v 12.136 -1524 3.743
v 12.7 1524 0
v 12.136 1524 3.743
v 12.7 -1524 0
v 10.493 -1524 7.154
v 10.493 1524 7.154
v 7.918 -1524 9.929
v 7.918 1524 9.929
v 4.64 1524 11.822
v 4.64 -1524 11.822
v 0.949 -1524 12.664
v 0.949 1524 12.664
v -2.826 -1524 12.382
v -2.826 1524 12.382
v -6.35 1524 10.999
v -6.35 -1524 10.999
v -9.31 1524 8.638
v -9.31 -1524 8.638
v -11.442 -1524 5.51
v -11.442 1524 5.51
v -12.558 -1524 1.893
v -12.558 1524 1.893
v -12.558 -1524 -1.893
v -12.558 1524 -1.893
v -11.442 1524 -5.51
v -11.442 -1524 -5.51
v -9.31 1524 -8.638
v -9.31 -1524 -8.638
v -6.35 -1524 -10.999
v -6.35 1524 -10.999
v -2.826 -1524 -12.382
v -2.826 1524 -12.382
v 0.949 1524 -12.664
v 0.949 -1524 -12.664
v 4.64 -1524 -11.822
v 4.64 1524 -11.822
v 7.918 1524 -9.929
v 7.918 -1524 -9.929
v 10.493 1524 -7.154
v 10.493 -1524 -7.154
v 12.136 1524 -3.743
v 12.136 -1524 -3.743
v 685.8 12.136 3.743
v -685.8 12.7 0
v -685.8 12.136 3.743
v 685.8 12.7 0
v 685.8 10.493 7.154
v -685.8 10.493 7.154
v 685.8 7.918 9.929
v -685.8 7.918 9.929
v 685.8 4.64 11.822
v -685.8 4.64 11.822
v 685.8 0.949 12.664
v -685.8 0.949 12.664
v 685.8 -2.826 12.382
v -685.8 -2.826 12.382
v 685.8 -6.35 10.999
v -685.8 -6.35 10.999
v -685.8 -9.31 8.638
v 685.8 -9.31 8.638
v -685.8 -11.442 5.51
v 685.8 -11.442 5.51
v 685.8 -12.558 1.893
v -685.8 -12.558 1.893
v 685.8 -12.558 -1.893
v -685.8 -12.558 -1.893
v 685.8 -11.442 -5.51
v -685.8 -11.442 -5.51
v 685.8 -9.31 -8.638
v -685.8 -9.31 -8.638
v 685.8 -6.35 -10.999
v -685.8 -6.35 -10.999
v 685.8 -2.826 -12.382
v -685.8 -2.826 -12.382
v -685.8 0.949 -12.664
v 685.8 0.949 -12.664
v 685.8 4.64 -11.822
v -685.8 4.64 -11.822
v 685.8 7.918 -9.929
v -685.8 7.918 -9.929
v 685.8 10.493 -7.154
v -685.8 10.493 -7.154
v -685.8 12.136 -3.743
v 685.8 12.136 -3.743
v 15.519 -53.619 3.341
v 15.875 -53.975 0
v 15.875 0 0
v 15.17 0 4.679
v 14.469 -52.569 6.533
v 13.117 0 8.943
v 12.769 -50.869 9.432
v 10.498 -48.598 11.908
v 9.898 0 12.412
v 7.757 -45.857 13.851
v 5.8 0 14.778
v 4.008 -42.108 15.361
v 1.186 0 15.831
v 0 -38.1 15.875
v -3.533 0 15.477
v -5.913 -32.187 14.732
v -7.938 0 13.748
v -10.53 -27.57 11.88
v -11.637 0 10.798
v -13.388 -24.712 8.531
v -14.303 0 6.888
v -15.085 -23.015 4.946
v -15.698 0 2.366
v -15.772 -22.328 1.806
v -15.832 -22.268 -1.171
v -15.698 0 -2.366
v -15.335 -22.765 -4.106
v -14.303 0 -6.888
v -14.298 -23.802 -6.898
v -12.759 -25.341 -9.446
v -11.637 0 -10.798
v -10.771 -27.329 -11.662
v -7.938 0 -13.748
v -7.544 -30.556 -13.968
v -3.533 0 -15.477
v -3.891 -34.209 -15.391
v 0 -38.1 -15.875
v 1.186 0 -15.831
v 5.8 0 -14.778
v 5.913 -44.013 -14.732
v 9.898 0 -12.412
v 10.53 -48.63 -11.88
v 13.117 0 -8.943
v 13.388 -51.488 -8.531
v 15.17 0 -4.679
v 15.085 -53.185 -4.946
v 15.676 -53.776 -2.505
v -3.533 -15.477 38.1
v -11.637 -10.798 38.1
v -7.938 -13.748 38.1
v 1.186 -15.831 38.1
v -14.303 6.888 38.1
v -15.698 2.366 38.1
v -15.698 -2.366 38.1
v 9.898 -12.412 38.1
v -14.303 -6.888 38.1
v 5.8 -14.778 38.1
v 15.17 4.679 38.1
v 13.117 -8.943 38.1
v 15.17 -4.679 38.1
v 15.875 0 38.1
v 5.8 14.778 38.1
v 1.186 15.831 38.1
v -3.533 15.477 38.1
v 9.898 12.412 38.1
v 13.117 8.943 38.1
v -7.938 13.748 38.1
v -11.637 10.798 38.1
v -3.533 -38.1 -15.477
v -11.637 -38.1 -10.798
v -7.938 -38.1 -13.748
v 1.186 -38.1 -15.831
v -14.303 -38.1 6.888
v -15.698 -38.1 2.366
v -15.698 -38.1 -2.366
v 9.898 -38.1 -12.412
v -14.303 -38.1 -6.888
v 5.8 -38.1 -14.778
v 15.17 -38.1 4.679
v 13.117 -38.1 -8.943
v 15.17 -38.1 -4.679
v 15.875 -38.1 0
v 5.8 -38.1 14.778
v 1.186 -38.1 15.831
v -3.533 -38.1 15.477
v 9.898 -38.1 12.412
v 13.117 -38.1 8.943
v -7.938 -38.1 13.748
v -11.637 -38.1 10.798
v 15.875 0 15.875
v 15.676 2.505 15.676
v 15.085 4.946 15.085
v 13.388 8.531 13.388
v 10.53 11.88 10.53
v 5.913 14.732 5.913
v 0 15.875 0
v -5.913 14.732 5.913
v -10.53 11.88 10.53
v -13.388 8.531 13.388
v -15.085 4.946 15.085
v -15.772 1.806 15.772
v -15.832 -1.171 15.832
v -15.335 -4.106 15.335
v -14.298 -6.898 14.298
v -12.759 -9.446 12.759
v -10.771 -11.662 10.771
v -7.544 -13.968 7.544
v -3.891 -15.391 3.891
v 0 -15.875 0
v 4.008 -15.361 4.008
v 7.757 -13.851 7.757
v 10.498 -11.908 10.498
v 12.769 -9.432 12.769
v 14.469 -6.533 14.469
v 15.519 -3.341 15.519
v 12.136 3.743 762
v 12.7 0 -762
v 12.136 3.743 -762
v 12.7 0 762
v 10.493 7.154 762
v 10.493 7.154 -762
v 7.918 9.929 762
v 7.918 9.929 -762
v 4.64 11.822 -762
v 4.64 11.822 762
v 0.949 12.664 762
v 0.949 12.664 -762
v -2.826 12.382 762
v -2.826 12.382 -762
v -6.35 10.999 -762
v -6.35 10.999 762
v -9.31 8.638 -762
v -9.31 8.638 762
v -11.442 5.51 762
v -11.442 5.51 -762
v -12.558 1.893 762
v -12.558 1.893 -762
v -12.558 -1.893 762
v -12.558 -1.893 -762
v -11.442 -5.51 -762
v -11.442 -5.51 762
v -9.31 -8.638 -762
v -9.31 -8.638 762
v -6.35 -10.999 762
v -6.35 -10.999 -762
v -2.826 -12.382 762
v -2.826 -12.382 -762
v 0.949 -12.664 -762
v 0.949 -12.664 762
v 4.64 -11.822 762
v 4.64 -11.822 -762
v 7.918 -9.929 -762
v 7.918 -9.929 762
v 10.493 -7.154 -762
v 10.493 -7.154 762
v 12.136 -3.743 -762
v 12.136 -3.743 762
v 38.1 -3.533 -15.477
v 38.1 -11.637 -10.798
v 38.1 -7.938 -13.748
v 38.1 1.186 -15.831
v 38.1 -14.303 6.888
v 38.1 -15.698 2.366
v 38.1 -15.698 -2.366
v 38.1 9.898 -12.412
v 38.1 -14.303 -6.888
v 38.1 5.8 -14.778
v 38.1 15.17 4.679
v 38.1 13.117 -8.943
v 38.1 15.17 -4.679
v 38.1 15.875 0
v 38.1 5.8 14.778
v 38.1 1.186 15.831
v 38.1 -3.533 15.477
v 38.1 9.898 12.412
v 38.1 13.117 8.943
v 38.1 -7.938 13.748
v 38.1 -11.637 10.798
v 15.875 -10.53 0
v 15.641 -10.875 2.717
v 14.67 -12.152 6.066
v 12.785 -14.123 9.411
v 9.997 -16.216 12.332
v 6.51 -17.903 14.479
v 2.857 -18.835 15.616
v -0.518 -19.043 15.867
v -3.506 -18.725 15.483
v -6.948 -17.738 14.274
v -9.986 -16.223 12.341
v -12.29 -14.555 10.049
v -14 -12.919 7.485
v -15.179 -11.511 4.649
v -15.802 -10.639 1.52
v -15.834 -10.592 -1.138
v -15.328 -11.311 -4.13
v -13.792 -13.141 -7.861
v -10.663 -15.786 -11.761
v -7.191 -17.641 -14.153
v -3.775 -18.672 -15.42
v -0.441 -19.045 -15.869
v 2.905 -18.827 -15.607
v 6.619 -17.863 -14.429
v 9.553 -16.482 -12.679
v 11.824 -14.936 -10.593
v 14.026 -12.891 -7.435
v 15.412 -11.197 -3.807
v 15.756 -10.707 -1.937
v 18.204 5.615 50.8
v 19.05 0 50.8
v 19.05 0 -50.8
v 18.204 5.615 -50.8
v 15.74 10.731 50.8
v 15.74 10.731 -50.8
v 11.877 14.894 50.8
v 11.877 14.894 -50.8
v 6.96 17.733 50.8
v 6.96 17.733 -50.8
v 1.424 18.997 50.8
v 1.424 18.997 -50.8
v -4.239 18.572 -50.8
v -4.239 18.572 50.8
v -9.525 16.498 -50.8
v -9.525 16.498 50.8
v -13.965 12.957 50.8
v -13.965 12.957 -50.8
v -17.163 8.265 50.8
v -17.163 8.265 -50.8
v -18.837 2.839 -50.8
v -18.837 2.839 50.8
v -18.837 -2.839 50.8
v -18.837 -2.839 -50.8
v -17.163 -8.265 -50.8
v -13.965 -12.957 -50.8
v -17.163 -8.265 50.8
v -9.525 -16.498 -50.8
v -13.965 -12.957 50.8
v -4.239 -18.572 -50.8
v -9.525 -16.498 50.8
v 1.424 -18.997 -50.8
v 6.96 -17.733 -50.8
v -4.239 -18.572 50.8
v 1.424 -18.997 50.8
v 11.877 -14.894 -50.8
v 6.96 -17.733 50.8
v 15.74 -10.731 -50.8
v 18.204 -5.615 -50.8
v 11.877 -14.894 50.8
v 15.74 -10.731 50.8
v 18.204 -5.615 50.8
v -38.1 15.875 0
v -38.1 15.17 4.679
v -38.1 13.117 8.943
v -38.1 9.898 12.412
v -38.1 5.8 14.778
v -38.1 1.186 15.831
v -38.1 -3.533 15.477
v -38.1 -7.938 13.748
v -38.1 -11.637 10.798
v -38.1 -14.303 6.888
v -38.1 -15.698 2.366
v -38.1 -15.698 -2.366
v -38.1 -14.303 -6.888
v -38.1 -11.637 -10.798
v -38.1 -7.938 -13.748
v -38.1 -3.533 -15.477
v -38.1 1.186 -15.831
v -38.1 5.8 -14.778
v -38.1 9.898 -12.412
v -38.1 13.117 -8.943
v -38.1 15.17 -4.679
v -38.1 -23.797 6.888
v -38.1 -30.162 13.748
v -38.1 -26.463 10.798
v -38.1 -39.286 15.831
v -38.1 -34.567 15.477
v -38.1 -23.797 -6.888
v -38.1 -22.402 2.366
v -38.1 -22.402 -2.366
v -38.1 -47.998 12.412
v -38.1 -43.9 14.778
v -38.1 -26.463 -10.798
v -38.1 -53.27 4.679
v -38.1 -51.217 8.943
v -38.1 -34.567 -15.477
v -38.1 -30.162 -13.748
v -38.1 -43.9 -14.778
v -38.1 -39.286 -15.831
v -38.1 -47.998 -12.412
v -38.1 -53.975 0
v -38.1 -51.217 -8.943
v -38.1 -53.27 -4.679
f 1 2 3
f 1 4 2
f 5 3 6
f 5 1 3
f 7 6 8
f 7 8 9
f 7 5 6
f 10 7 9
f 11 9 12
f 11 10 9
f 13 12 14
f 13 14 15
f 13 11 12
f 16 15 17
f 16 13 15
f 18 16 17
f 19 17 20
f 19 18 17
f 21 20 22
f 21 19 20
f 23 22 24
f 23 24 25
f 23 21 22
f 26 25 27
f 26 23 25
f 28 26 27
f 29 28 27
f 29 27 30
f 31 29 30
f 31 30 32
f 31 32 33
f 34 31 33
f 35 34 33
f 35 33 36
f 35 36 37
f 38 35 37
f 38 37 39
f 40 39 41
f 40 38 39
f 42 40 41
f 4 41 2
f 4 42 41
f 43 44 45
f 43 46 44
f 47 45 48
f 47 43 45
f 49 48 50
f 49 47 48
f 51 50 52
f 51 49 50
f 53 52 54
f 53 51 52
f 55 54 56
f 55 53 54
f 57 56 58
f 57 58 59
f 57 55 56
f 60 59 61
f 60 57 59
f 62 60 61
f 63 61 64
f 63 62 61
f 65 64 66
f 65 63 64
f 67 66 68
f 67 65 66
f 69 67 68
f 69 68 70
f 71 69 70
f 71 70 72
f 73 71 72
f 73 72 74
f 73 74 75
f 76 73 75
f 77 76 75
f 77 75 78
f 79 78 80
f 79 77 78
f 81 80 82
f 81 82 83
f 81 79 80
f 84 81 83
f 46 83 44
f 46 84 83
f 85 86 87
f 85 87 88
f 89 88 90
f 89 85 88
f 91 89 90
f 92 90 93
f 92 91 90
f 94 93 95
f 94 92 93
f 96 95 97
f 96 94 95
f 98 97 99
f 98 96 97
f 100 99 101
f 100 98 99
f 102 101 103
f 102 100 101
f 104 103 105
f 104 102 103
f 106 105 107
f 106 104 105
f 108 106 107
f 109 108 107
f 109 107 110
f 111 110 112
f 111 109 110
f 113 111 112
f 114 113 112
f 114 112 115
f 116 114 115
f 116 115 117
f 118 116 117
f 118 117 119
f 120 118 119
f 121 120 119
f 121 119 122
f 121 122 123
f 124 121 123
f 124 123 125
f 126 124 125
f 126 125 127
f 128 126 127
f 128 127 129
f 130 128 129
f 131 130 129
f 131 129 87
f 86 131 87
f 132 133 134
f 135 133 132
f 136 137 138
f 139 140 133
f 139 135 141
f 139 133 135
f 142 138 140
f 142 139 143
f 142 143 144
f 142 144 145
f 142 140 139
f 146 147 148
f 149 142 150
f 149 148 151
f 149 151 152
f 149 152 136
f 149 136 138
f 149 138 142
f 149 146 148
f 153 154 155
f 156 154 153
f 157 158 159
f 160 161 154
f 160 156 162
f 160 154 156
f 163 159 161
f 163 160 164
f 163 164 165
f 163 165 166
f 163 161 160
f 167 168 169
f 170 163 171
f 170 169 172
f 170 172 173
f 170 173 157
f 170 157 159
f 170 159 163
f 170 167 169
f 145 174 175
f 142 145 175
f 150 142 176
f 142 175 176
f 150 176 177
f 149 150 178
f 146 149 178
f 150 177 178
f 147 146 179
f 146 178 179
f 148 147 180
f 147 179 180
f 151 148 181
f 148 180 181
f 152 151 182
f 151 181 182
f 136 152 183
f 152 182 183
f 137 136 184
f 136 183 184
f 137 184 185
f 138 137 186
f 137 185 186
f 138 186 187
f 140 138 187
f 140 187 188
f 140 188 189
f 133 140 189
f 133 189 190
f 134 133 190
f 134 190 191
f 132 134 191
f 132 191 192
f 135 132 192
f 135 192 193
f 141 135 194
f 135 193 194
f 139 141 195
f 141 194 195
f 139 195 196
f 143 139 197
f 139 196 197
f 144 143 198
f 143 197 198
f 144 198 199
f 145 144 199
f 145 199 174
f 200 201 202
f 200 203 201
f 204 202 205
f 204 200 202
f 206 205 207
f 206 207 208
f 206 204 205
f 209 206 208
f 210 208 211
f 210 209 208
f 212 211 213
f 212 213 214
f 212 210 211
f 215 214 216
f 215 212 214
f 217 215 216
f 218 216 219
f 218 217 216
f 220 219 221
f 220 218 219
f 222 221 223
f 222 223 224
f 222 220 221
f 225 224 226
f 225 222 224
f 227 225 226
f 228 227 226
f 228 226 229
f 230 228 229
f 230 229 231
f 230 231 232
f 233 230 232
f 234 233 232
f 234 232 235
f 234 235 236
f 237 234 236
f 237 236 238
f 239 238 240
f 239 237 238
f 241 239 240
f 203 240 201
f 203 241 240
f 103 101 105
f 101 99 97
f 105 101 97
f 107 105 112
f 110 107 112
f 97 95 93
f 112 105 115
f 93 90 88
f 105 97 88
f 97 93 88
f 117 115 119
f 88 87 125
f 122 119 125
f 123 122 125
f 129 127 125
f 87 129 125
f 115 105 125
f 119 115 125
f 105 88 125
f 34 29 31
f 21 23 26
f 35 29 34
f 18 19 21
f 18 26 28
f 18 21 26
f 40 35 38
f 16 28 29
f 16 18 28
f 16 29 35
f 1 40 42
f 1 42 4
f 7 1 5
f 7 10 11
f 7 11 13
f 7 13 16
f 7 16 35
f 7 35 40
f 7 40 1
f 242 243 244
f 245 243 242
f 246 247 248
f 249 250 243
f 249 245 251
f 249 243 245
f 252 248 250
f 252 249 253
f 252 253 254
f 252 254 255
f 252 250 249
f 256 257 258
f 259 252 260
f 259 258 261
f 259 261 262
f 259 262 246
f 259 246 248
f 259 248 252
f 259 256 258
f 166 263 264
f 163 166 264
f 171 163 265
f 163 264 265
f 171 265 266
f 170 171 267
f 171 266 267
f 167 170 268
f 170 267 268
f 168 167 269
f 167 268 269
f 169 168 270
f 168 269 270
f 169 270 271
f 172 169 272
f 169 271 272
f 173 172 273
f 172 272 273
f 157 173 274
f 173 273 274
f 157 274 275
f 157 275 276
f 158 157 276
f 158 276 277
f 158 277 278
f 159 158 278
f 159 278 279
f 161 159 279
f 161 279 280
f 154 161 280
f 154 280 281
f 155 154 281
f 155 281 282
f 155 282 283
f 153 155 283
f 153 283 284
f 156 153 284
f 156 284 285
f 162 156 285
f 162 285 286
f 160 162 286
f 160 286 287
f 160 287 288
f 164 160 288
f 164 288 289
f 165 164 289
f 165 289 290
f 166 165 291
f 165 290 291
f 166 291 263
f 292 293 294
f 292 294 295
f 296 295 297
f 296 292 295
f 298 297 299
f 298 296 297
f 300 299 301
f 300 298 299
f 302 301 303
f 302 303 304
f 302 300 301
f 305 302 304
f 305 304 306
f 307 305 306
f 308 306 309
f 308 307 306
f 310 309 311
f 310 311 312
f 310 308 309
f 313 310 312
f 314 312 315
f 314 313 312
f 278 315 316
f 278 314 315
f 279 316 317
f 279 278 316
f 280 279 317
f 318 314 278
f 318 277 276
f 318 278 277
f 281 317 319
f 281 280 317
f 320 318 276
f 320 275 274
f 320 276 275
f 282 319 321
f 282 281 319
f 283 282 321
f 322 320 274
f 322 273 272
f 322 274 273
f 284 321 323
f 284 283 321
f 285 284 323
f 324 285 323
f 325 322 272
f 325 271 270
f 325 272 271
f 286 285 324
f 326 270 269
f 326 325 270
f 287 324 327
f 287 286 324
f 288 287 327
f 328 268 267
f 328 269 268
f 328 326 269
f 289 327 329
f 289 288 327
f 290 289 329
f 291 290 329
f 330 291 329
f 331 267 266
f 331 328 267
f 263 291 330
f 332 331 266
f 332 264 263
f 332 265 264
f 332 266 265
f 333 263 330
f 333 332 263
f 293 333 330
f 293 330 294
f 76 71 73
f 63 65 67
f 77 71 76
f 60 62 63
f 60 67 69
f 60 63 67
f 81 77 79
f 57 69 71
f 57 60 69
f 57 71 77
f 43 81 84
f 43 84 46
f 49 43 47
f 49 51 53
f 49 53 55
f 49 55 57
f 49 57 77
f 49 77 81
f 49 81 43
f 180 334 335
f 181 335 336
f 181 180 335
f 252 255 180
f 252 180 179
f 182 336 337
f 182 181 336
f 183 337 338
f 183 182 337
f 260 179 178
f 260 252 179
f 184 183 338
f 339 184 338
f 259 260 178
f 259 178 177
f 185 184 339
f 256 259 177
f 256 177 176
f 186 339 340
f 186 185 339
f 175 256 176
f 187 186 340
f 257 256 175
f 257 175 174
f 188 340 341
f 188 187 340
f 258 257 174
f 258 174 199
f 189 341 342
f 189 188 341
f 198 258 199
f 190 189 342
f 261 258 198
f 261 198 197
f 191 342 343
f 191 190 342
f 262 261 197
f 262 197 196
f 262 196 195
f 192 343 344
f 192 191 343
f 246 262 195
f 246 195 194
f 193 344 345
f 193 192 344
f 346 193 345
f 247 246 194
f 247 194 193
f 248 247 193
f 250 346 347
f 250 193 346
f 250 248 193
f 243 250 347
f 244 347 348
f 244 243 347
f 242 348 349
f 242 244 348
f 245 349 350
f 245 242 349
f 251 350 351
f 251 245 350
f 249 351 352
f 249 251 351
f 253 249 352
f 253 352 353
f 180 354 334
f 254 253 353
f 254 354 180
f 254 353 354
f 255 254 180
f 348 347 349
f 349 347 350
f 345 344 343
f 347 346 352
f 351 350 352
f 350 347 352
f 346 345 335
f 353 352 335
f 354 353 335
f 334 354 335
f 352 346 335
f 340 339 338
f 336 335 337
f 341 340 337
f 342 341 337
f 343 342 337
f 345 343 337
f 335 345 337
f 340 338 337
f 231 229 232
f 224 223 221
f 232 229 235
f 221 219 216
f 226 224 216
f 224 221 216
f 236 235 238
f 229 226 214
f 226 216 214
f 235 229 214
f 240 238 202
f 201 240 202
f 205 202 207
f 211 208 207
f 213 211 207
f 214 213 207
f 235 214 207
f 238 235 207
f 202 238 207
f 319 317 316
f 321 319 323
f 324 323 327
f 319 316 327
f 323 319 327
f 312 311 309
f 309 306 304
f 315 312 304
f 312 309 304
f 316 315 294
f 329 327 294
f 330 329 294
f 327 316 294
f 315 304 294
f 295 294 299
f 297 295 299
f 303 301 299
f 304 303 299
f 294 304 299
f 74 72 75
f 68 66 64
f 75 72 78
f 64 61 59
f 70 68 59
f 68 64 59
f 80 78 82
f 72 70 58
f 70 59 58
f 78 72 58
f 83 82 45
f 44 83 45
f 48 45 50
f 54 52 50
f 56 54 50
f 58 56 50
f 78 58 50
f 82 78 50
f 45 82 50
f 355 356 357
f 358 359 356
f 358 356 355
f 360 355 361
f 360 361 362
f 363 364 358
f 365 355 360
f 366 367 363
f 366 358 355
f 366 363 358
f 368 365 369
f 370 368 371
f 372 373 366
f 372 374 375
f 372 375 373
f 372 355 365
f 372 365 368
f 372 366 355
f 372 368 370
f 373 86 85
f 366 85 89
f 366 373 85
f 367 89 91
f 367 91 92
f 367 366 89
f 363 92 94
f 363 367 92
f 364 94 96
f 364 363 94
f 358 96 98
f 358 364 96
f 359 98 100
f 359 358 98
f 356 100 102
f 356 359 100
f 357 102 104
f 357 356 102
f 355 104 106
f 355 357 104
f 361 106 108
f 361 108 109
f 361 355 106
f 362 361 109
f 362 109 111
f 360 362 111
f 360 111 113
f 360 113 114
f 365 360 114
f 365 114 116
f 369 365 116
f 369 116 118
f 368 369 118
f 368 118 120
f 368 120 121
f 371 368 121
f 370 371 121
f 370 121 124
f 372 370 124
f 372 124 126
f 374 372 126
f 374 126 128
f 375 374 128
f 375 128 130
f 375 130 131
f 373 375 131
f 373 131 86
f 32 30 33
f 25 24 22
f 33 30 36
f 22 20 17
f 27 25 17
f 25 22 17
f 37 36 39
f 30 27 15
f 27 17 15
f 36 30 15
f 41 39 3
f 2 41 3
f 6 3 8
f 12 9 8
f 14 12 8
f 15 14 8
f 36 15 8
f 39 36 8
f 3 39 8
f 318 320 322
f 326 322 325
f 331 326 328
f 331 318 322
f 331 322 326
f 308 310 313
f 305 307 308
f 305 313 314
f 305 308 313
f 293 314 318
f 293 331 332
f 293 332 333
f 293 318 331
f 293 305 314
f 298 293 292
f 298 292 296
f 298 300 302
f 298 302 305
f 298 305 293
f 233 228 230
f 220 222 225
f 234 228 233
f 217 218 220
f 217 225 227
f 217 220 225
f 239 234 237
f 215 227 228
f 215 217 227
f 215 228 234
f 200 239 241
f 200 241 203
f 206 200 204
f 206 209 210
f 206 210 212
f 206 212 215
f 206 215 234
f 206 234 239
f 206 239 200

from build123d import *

# Parameters (mm, degrees)
F0_R      = 12.7
F1_DEPTH  = 1524
F3_R      = 15.875
F5_R      = 12.7
F6_DEPTH  = 762
F7_R      = 15.875
F8_DEPTH  = 38.1
F9_R      = 15.875
F10_DEPTH = 38.1
F11_R     = 19.05
F12_DEPTH = 50.8
F13_R     = 15.875
F14_DEPTH = 38.1
F15_R     = 12.7
F16_DEPTH = 685.8


with BuildPart() as f1:
    # F0 (on Front) → F1 (new body, symmetric)
    with BuildSketch(Plane.XZ):
        Circle(F0_R)
    extrude(amount=F1_DEPTH, both=True)


with BuildPart() as f4:
    # F4: sweep along a path in F2
    with BuildLine(Plane.XY) as f4_path:
        Line((0, 0), (0, -38.1))
        Line((0, -38.1), (-38.1, -38.1))
    # F3 (on Front) → F4 (sweep)
    with BuildSketch(Plane.XZ):
        Circle(F3_R)
    sweep(path=f4_path.line, transition=Transition.RIGHT)


with BuildPart() as f6:
    # F5 (on Top) → F6 (new body, symmetric)
    with BuildSketch(Plane.XY):
        Circle(F5_R)
    extrude(amount=F6_DEPTH, both=True)


with BuildPart() as f8:
    # F7 (on Right) → F8 (new body, symmetric)
    with BuildSketch(Plane.YZ):
        Circle(F7_R)
    extrude(amount=F8_DEPTH, both=True)

    # F9 (on Top) → F10 (join)
    with BuildSketch(Plane.XY):
        Circle(F9_R)
    extrude(amount=F10_DEPTH)


with BuildPart() as f12:
    # F11 (on Top) → F12 (new body, symmetric)
    with BuildSketch(Plane.XY):
        Circle(F11_R)
    extrude(amount=F12_DEPTH, both=True)

    # F13 (on Front) → F14 (join)
    with BuildSketch(Plane.XZ):
        Circle(F13_R)
    extrude(amount=F14_DEPTH)


with BuildPart() as f16:
    # F15 (on Right) → F16 (new body, symmetric)
    with BuildSketch(Plane.YZ):
        Circle(F15_R)
    extrude(amount=F16_DEPTH, both=True)


solid = Compound([f1.part, f4.part, f6.part, f8.part, f12.part, f16.part])
